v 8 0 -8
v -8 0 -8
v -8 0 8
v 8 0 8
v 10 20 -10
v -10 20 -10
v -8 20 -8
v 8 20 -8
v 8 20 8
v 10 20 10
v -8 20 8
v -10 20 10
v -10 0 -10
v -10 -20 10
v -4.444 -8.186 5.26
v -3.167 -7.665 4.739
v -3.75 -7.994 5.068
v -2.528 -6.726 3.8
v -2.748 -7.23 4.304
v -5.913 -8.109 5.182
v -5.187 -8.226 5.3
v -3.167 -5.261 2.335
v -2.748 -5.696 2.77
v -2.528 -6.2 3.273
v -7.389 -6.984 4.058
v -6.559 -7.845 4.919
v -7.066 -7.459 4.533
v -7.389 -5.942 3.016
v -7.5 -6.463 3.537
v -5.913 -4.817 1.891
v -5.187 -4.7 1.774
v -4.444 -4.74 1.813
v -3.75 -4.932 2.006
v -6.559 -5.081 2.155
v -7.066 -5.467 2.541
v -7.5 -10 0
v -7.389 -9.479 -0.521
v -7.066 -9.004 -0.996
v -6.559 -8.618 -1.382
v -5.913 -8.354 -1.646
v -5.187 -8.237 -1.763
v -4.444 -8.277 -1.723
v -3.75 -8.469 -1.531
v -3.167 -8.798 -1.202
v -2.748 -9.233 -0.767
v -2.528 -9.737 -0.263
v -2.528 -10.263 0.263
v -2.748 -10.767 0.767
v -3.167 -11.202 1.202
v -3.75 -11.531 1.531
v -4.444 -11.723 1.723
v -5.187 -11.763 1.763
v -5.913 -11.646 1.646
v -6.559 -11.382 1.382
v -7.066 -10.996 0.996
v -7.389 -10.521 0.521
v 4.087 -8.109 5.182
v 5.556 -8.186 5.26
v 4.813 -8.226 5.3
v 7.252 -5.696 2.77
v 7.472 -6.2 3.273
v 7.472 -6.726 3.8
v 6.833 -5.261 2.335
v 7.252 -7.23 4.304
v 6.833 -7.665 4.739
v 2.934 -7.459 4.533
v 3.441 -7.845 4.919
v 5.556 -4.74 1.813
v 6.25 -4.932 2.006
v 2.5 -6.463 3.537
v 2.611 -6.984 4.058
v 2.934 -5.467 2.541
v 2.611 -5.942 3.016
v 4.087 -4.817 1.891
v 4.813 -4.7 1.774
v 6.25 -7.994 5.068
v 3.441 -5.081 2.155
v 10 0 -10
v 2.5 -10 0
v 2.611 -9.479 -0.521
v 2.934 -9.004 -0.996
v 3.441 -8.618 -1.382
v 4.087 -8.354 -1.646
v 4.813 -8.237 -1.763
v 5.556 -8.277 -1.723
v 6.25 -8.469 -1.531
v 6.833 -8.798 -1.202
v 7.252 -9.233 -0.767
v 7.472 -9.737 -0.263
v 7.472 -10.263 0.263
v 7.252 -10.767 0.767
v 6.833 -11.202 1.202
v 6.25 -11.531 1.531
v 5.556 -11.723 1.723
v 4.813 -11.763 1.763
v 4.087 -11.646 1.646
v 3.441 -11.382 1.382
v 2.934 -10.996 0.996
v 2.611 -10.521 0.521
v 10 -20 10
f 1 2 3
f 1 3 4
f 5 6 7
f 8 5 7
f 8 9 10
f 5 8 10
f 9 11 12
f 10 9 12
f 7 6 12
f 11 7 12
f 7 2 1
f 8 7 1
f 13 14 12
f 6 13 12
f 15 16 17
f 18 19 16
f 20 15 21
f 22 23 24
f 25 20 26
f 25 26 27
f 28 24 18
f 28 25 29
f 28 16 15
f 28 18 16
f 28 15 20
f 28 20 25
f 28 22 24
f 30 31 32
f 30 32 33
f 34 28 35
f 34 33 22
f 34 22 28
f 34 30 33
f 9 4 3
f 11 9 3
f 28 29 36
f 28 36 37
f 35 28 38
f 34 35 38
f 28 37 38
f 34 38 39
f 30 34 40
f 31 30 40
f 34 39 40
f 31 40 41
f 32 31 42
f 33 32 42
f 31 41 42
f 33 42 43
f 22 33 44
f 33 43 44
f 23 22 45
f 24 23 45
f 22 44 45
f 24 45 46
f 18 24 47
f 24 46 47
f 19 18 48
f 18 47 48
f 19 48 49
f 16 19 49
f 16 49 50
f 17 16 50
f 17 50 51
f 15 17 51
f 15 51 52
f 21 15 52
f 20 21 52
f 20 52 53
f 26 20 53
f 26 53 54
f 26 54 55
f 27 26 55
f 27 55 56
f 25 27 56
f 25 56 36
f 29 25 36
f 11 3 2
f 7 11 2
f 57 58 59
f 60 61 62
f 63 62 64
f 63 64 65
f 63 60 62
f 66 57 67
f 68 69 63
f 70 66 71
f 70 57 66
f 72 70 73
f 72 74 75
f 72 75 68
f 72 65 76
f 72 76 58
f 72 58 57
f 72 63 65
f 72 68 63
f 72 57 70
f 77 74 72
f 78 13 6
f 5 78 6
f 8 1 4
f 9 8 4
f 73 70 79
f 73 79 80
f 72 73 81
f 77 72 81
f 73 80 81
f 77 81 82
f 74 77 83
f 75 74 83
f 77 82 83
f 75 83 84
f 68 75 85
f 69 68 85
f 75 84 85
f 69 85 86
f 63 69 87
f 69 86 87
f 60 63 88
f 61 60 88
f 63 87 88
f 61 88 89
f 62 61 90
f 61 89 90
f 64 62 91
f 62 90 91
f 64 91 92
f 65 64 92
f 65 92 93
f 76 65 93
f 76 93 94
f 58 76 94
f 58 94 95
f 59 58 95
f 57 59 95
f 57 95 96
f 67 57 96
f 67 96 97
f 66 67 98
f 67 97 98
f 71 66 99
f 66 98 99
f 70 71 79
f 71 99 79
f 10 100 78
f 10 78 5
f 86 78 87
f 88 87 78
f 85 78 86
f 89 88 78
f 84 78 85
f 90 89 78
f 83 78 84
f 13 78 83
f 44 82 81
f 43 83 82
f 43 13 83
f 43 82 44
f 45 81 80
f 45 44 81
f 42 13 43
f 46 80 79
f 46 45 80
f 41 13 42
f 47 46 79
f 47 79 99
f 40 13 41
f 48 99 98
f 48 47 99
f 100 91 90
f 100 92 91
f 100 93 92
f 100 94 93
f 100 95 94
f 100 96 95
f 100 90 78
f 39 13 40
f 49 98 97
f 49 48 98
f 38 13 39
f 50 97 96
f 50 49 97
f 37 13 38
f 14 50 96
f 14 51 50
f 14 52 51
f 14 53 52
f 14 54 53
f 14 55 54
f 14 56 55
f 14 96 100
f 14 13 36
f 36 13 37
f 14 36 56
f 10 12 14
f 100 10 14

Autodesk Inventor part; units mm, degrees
sketch "Sketch1" plane through (0, 0, 0) normal (1, 0, 0) x (0, 1, 0)
  line L0 (20, 10) -> (-20, 10)
  line L1 (-20, 10) -> (-20, -10)
  line L2 (-20, -10) -> (20, -10)
  line L3 (20, -10) -> (20, 10)
  line L4 (-28, 0) -> (28, 0) projected
  line L5 (0, 14) -> (0, -14) projected
  line L6 (0, -10) -> (-20, 10)
  point P0 (0, 0)
  point P1 (20, 0)
  point P2 (0, 10)
  dimension "d0" = 20
  dimension "d1" = 40
extrude "Extrusion1" add sketch "Sketch1" along normal mid plane 20 contours L3 L4 L5 L0 | L5 L4 L6 L0 | L3 L2 L5 L4 | L5 L6 L4
sketch "Sketch2" plane through (-10, 20, 10) normal (0, 1, 0) x (1, 0, 0)
  line L0 (20, 20) -> (0, 20) projected
  line L1 (20, 20) -> (20, 0) projected
  line L2 (0, 0) -> (0, 20) projected
  line L3 (0, 0) -> (20, 0) projected
  line L4 (2, 18) -> (18, 18)
  line L5 (18, 18) -> (18, 2)
  line L6 (18, 2) -> (2, 2)
  line L7 (2, 2) -> (2, 18)
  point P0 (10, 10)
  dimension "d4" = 2
extrude "Extrusion2" cut sketch "Sketch2" against normal blind 20 contours L4 L5 L6 L7
sketch "Sketch3" plane through (10, 0, -10) normal (0, -0.7071, -0.7071) x (-1, 0, 0)
  line L0 (10, -36.7696) -> (10, 22.6274) projected
  line L1 (20, -28.2843) -> (0, -28.2843) projected
  line L2 (10, -28.2843) -> (10, 0)
  line L3 (20, 0) -> (0, 0) projected
  line L4 (10, -14.1421) -> (20, -14.1421)
  line L5 (20, -28.2843) -> (20, 0) projected
  line L6 (10, -14.1421) -> (0, -14.1421)
  circle A0 centre (5, -14.1421) radius 2.5
  line L7 (0, -28.2843) -> (0, 0) projected
  circle A1 centre (15, -14.1421) radius 2.5
  point P0 (10, -7.0711)
  point P1 (0, -14.1421)
  dimension "d8" = 5
  dimension "d9" = 5
extrude "Extrusion3" cut sketch "Sketch3" against normal blind 5 contours A1 L4 | L4 A1 | A0 L6 | L6 A0
properties part number "Chimney"
